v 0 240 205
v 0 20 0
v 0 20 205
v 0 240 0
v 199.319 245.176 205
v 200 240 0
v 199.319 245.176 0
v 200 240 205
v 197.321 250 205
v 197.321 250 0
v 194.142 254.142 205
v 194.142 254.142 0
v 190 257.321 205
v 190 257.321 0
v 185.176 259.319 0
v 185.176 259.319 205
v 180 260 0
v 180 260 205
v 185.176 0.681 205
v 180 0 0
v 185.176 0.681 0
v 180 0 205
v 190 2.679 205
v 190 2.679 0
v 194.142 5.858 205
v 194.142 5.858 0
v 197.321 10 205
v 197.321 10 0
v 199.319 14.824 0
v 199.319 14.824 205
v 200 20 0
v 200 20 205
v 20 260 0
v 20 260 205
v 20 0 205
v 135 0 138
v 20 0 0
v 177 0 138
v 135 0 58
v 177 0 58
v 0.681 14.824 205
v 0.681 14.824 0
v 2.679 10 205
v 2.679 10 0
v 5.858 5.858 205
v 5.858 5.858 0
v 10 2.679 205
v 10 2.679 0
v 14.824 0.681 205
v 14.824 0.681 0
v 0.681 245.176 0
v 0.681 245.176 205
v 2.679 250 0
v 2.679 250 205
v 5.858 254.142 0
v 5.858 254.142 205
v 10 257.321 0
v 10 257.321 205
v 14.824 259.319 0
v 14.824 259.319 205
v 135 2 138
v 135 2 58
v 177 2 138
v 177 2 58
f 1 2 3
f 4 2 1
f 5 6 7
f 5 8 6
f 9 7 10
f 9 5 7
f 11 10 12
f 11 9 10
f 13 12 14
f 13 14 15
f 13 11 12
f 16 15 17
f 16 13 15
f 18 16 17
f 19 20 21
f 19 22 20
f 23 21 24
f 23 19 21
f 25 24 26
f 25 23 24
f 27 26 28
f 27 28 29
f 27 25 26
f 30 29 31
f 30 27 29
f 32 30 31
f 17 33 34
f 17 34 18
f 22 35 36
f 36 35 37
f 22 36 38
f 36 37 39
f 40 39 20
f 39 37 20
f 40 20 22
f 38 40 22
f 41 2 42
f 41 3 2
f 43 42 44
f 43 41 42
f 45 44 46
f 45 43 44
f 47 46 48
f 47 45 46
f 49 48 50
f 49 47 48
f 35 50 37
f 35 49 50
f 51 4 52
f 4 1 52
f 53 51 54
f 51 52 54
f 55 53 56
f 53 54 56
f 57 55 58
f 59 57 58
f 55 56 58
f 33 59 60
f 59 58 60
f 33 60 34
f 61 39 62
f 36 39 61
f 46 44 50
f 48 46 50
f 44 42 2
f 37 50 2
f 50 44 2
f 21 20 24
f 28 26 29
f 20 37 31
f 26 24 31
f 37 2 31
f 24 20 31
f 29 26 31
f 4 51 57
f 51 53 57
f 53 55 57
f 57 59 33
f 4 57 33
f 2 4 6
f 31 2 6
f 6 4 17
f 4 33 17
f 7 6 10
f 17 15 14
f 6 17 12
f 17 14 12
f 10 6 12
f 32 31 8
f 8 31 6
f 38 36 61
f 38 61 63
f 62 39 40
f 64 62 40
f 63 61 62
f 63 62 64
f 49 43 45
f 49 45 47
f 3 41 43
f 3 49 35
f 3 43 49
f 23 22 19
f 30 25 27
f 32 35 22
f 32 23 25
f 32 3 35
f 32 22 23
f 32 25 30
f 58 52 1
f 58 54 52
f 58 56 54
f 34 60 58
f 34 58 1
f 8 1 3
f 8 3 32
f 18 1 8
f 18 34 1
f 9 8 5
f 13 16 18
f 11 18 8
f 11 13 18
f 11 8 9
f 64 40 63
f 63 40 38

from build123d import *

# Parameters (mm, degrees)
F0_W     = 200
F0_H     = 260
F1_DEPTH = 205
F2_R     = 20
F3_W     = 42
F3_H     = 80
F4_DEPTH = 2


with BuildPart() as f1:
    # F0 (on Top) → F1 (new body)
    with BuildSketch(Plane.XY):
        with Locations((100, 130)):
            Rectangle(F0_W, F0_H)
    extrude(amount=F1_DEPTH)

    # F2
    f2_edges = [f1.edges().sort_by_distance(p)[0] for p in [
        (0, 0, 102.5),
        (0, 260, 102.5),
        (200, 260, 102.5),
        (200, 0, 102.5),
    ]]
    fillet(f2_edges, radius=F2_R)

    # F3 (on face) → F4 (cut)
    with BuildSketch(Plane.XZ):
        with Locations((156, 98)):
            Rectangle(F3_W, F3_H)
    extrude(amount=-F4_DEPTH, mode=Mode.SUBTRACT)


solid = f1.part
